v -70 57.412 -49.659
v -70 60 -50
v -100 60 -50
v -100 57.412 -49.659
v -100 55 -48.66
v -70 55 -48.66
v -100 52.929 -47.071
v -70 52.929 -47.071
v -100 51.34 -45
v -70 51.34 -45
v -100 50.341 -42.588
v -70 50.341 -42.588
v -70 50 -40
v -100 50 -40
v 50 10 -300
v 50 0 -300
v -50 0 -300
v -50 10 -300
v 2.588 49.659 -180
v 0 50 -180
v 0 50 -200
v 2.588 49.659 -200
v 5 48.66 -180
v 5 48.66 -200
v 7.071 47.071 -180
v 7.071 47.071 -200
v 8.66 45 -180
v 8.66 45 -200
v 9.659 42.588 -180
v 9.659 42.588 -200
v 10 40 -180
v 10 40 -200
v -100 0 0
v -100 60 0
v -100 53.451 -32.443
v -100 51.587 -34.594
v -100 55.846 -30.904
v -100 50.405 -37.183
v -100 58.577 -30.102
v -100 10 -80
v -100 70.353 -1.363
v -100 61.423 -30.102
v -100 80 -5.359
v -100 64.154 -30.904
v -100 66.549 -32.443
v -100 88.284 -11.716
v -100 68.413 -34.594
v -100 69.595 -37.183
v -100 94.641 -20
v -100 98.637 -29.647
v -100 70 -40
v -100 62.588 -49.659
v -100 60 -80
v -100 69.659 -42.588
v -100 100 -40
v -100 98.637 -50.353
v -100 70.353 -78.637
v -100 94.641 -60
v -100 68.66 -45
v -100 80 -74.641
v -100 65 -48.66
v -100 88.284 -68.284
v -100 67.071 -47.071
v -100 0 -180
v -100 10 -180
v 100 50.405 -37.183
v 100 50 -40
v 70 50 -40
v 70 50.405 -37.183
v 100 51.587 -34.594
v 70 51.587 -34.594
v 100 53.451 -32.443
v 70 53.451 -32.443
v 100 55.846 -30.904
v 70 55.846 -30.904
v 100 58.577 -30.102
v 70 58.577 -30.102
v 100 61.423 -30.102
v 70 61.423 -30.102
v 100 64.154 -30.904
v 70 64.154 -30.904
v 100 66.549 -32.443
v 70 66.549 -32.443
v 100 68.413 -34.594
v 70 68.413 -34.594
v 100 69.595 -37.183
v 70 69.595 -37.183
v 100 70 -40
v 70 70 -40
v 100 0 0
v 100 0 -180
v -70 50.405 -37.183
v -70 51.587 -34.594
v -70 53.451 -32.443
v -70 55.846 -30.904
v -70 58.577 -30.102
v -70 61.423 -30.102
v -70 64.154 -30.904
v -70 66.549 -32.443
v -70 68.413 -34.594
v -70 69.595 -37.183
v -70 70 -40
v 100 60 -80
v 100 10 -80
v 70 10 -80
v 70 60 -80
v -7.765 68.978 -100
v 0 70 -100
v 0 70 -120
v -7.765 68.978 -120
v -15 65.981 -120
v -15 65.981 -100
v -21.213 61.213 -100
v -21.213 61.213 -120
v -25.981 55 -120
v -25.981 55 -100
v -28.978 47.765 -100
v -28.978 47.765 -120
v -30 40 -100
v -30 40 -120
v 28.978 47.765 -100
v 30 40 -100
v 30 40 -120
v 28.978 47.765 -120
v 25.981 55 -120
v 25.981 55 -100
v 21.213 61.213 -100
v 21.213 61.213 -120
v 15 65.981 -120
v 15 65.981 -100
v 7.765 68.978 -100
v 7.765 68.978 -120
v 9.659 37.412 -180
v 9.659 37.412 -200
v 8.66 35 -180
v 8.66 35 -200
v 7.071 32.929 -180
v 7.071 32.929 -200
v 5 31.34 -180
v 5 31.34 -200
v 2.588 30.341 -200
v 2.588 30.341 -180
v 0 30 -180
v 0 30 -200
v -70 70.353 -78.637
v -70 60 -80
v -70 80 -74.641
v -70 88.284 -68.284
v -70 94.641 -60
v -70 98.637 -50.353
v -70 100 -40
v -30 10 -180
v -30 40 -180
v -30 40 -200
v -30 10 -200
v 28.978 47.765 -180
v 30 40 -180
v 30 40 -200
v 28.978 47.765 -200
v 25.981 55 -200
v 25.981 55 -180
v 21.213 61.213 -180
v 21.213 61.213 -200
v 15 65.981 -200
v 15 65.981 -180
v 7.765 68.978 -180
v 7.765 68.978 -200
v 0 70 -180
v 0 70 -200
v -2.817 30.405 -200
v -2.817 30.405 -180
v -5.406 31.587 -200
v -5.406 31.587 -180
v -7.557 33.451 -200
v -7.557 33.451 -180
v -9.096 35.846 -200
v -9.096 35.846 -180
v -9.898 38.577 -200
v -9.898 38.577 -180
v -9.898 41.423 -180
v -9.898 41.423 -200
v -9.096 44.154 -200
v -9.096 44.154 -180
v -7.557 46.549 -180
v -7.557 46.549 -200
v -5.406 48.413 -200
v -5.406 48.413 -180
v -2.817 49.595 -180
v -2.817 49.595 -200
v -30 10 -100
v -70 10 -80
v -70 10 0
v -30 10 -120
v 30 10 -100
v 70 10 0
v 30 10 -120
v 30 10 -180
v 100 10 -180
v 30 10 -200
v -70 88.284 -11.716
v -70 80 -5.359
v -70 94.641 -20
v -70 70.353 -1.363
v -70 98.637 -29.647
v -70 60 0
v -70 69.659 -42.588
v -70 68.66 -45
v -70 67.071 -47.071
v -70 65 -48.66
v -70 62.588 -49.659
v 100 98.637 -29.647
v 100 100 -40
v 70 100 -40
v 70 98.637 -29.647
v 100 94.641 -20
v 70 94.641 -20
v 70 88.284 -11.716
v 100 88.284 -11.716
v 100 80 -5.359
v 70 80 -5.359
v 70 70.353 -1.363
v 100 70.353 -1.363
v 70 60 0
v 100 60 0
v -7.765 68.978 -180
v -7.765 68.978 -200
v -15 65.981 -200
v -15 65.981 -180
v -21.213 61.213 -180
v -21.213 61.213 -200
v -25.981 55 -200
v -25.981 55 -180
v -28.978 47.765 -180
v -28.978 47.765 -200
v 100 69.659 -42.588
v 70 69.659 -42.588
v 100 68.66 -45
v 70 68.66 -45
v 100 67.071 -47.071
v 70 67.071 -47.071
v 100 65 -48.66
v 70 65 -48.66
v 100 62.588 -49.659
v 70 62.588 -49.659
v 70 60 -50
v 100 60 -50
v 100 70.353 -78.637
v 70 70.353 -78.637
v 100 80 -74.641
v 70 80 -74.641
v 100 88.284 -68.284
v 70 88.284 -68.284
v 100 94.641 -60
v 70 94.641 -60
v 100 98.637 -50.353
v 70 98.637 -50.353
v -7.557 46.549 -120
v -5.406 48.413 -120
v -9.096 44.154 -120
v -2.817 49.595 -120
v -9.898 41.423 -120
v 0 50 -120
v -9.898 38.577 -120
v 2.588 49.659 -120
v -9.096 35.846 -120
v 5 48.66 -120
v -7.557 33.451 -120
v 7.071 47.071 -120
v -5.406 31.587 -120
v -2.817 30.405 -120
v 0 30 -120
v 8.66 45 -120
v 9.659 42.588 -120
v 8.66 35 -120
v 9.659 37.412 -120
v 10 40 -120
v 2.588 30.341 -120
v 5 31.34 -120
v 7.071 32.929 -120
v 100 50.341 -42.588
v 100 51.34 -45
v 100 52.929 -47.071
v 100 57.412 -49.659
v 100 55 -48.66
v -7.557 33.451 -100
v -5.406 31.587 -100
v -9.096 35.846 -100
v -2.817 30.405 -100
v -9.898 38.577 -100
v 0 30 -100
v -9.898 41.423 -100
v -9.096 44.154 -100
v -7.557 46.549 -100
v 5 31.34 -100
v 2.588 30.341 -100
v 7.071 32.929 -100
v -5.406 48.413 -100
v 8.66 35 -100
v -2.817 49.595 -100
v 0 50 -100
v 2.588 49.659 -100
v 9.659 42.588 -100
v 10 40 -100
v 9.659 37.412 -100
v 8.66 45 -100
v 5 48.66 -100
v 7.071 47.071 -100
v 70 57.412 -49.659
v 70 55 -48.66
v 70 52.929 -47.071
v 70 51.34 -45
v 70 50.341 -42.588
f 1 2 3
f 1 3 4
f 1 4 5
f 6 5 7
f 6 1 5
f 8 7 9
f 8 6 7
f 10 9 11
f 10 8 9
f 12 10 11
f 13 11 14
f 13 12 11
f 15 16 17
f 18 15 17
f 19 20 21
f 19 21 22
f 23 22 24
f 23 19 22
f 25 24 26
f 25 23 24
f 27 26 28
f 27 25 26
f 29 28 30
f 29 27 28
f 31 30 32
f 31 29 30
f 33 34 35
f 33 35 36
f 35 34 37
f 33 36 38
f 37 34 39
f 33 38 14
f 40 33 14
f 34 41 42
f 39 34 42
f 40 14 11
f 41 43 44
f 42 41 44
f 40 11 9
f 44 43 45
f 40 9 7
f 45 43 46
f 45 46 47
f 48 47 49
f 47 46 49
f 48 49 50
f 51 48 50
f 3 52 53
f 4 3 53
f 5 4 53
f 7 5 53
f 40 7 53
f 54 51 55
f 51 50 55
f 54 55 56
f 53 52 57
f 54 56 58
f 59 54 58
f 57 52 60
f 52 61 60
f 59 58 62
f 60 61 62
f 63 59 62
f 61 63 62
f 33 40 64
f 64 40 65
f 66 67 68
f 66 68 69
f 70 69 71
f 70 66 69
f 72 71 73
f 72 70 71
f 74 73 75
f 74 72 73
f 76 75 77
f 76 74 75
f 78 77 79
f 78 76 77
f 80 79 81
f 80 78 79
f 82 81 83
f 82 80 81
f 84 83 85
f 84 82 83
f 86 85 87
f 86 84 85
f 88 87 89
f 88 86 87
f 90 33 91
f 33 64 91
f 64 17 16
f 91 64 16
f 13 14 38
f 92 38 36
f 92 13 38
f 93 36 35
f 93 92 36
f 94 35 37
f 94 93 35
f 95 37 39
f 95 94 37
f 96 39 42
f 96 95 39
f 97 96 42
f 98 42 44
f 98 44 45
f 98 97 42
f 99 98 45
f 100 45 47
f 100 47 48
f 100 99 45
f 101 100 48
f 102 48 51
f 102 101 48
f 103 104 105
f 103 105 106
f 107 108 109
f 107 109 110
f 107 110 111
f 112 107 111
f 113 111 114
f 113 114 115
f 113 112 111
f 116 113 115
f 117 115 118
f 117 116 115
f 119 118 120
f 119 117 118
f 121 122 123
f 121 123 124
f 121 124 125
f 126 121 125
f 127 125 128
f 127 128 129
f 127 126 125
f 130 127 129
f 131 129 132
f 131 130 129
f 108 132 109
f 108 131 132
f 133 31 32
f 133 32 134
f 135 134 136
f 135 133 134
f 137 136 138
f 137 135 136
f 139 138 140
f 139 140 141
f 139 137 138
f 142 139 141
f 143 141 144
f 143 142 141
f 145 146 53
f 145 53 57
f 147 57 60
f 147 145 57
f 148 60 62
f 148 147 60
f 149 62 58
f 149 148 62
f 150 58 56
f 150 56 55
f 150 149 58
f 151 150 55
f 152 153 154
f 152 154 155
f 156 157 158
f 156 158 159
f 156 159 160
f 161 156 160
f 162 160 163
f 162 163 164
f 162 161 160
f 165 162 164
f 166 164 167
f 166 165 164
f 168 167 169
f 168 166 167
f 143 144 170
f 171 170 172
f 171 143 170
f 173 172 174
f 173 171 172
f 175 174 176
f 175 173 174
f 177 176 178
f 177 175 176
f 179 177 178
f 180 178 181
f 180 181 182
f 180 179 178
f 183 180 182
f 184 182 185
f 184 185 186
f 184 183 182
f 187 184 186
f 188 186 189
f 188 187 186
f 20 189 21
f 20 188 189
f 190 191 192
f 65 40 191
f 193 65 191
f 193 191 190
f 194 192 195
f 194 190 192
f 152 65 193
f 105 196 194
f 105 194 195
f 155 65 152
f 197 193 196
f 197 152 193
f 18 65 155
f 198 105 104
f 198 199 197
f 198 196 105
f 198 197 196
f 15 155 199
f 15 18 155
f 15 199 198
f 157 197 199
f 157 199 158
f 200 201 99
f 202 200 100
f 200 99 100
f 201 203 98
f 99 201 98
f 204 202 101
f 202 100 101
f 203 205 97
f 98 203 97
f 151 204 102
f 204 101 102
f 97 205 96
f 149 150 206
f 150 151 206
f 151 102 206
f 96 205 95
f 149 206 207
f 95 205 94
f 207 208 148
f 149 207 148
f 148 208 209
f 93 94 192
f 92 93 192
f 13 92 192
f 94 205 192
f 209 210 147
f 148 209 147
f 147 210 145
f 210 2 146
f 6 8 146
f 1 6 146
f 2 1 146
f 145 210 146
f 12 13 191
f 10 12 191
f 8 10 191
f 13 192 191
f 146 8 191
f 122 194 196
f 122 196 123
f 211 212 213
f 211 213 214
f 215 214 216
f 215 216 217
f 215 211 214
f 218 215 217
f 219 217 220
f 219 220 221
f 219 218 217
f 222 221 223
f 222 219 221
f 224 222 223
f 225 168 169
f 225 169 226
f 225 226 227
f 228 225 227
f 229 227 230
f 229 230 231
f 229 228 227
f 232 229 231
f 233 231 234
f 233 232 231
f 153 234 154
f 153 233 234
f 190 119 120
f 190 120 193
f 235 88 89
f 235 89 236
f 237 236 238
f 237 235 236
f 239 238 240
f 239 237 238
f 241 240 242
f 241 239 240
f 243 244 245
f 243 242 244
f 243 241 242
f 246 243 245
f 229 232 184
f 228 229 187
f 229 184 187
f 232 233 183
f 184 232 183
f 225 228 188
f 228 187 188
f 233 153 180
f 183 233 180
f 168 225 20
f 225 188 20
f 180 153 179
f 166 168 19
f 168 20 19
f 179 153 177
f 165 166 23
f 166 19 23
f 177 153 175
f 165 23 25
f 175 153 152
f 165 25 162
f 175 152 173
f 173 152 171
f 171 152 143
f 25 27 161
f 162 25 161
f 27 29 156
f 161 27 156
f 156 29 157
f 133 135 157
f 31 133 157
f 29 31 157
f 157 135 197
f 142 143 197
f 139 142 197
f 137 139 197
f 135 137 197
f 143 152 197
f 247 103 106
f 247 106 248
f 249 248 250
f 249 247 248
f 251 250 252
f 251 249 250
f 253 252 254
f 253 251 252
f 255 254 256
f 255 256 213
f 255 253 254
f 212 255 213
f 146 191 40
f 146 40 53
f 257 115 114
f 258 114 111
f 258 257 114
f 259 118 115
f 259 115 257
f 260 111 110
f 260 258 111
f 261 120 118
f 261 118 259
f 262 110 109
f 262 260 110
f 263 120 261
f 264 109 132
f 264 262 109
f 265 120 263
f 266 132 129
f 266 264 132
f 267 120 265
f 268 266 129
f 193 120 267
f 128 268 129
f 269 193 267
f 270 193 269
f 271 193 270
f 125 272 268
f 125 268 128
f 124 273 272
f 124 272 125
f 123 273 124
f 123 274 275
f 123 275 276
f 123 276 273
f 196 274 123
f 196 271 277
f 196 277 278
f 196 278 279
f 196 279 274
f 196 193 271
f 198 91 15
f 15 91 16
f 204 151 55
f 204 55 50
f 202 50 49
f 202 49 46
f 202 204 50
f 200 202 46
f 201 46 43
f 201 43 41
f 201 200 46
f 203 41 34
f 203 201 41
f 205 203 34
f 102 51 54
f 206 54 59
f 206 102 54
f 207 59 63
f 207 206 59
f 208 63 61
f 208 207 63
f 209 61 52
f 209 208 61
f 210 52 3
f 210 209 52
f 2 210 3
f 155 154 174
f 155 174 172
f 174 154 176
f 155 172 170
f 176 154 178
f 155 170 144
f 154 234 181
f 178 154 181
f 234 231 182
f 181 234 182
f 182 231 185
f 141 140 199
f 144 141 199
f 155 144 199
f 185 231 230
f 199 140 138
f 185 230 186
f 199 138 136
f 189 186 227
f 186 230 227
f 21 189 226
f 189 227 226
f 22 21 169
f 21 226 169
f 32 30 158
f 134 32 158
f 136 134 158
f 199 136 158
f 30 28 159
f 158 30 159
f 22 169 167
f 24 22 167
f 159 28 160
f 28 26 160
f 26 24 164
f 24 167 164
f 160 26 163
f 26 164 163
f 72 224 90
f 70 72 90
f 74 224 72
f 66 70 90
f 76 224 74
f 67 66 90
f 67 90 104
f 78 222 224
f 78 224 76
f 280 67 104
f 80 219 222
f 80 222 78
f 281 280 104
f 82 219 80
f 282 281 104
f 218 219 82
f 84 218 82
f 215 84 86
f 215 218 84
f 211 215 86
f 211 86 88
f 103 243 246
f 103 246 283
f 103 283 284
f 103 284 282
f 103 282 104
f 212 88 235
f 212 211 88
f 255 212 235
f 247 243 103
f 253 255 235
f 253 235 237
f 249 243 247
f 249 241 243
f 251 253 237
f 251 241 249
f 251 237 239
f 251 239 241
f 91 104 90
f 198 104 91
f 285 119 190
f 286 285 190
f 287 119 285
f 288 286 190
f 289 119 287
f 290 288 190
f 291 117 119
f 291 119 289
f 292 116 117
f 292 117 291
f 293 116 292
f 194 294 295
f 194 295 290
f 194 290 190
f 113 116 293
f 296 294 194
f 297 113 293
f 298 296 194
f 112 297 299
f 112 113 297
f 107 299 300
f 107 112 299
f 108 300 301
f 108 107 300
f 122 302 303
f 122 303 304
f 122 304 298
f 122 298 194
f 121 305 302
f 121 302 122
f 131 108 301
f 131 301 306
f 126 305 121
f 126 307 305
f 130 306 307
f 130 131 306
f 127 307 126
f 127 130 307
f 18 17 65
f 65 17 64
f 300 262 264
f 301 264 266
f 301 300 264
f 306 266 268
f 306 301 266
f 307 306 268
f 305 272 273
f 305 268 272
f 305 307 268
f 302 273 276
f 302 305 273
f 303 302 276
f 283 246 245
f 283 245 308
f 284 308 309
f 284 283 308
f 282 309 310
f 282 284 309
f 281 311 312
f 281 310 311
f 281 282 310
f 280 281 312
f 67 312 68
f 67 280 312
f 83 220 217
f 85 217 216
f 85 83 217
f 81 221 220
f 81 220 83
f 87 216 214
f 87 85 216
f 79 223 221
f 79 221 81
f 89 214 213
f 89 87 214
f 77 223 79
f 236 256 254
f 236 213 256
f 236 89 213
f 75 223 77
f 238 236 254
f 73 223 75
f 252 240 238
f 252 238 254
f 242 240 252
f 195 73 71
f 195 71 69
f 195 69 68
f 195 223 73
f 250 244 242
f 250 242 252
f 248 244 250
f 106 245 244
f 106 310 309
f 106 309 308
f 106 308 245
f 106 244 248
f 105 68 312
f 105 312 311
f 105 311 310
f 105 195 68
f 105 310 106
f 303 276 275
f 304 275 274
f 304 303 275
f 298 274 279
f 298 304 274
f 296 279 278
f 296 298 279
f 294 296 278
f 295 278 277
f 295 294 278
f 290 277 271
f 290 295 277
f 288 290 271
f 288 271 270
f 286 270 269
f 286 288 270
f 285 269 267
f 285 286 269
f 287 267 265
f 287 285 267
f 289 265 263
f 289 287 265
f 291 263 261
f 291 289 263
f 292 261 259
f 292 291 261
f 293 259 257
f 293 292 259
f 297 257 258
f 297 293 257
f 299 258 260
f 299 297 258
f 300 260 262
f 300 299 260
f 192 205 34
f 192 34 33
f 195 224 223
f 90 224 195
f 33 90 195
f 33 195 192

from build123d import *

# Parameters (mm, degrees)
EXTRUDE_1_DEPTH     = 10
EXTRUDE_2_DEPTH     = 200
SKETCH_3_W          = 140
SKETCH_3_H          = 100
CUT_EXTRUDE_1_DEPTH = 171
EXTRUDE_START       = -100
EXTRUDE_3_DEPTH     = 100
SKETCH_5_W          = 80
SKETCH_5_H          = 60
CUT_EXTRUDE_2_DEPTH = 110


with BuildPart() as part:
    # 草图1 → 凸台-拉伸1 (new body)
    with BuildSketch(Plane(origin=(0, 0, 0), x_dir=(1, 0, 0), z_dir=(0, 1, 0))):
        Polygon((-100, 0), (100, 0), (100, 180), (50, 300), (-50, 300), (-100, 180), align=None)
    extrude(amount=EXTRUDE_1_DEPTH)

    # 草图2 → 凸台-拉伸2 (add)
    with BuildSketch(Plane(origin=(100, 0, 0), x_dir=(0, 0, -1), z_dir=(1, 0, 0))):
        with BuildLine():
            ThreePointArc((80, 60), (68.284271247, 88.284271247), (40, 100))
            Line((40, 100), (40, 70))
            ThreePointArc((40, 70), (47.071067812, 67.071067812), (50, 60))
            ThreePointArc((50, 60), (47.071067812, 52.928932188), (40, 50))
            Line((40, 50), (40, 10))
            Line((40, 10), (80, 10))
            Line((80, 10), (80, 60))
        make_face()
        with BuildLine():
            Line((40, 70), (40, 100))
            ThreePointArc((40, 100), (11.715728753, 88.284271247), (0, 60))
            Line((0, 60), (0, 10))
            Line((0, 10), (40, 10))
            Line((40, 10), (40, 50))
            ThreePointArc((40, 50), (30, 60), (40, 70))
        make_face()
    extrude(amount=-EXTRUDE_2_DEPTH)

    # 草图3 → 切除-拉伸1 (cut)
    with BuildSketch(Plane(origin=(0, 10, 0), x_dir=(1, 0, 0), z_dir=(0, 1, 0))):
        with Locations((0, 50)):
            Rectangle(SKETCH_3_W, SKETCH_3_H)
    extrude(amount=CUT_EXTRUDE_1_DEPTH, mode=Mode.SUBTRACT)

    # 草图4 → 凸台-拉伸3 (add)
    with BuildSketch(Plane.XY.offset(EXTRUDE_START)):
        with BuildLine():
            Line((0, 30), (0, 10))
            Line((0, 10), (30, 10))
            Line((30, 10), (30, 40))
            ThreePointArc((30, 40), (21.213203436, 61.213203436), (0, 70))
            Line((0, 70), (0, 50))
            ThreePointArc((0, 50), (7.071067812, 47.071067812), (10, 40))
            ThreePointArc((10, 40), (7.071067812, 32.928932188), (0, 30))
        make_face()
        with BuildLine():
            Line((-30, 10), (0, 10))
            Line((0, 10), (0, 30))
            ThreePointArc((0, 30), (-10, 40), (0, 50))
            Line((0, 50), (0, 70))
            ThreePointArc((0, 70), (-21.213203436, 61.213203436), (-30, 40))
            Line((-30, 40), (-30, 10))
        make_face()
    extrude(amount=-EXTRUDE_3_DEPTH)

    # 草图5 → 切除-拉伸2 (cut)
    with BuildSketch(Plane(origin=(0, 10, 0), x_dir=(1, 0, 0), z_dir=(0, 1, 0))):
        with Locations((0, 150)):
            Rectangle(SKETCH_5_W, SKETCH_5_H)
    extrude(amount=CUT_EXTRUDE_2_DEPTH, mode=Mode.SUBTRACT)


solid = part.part
